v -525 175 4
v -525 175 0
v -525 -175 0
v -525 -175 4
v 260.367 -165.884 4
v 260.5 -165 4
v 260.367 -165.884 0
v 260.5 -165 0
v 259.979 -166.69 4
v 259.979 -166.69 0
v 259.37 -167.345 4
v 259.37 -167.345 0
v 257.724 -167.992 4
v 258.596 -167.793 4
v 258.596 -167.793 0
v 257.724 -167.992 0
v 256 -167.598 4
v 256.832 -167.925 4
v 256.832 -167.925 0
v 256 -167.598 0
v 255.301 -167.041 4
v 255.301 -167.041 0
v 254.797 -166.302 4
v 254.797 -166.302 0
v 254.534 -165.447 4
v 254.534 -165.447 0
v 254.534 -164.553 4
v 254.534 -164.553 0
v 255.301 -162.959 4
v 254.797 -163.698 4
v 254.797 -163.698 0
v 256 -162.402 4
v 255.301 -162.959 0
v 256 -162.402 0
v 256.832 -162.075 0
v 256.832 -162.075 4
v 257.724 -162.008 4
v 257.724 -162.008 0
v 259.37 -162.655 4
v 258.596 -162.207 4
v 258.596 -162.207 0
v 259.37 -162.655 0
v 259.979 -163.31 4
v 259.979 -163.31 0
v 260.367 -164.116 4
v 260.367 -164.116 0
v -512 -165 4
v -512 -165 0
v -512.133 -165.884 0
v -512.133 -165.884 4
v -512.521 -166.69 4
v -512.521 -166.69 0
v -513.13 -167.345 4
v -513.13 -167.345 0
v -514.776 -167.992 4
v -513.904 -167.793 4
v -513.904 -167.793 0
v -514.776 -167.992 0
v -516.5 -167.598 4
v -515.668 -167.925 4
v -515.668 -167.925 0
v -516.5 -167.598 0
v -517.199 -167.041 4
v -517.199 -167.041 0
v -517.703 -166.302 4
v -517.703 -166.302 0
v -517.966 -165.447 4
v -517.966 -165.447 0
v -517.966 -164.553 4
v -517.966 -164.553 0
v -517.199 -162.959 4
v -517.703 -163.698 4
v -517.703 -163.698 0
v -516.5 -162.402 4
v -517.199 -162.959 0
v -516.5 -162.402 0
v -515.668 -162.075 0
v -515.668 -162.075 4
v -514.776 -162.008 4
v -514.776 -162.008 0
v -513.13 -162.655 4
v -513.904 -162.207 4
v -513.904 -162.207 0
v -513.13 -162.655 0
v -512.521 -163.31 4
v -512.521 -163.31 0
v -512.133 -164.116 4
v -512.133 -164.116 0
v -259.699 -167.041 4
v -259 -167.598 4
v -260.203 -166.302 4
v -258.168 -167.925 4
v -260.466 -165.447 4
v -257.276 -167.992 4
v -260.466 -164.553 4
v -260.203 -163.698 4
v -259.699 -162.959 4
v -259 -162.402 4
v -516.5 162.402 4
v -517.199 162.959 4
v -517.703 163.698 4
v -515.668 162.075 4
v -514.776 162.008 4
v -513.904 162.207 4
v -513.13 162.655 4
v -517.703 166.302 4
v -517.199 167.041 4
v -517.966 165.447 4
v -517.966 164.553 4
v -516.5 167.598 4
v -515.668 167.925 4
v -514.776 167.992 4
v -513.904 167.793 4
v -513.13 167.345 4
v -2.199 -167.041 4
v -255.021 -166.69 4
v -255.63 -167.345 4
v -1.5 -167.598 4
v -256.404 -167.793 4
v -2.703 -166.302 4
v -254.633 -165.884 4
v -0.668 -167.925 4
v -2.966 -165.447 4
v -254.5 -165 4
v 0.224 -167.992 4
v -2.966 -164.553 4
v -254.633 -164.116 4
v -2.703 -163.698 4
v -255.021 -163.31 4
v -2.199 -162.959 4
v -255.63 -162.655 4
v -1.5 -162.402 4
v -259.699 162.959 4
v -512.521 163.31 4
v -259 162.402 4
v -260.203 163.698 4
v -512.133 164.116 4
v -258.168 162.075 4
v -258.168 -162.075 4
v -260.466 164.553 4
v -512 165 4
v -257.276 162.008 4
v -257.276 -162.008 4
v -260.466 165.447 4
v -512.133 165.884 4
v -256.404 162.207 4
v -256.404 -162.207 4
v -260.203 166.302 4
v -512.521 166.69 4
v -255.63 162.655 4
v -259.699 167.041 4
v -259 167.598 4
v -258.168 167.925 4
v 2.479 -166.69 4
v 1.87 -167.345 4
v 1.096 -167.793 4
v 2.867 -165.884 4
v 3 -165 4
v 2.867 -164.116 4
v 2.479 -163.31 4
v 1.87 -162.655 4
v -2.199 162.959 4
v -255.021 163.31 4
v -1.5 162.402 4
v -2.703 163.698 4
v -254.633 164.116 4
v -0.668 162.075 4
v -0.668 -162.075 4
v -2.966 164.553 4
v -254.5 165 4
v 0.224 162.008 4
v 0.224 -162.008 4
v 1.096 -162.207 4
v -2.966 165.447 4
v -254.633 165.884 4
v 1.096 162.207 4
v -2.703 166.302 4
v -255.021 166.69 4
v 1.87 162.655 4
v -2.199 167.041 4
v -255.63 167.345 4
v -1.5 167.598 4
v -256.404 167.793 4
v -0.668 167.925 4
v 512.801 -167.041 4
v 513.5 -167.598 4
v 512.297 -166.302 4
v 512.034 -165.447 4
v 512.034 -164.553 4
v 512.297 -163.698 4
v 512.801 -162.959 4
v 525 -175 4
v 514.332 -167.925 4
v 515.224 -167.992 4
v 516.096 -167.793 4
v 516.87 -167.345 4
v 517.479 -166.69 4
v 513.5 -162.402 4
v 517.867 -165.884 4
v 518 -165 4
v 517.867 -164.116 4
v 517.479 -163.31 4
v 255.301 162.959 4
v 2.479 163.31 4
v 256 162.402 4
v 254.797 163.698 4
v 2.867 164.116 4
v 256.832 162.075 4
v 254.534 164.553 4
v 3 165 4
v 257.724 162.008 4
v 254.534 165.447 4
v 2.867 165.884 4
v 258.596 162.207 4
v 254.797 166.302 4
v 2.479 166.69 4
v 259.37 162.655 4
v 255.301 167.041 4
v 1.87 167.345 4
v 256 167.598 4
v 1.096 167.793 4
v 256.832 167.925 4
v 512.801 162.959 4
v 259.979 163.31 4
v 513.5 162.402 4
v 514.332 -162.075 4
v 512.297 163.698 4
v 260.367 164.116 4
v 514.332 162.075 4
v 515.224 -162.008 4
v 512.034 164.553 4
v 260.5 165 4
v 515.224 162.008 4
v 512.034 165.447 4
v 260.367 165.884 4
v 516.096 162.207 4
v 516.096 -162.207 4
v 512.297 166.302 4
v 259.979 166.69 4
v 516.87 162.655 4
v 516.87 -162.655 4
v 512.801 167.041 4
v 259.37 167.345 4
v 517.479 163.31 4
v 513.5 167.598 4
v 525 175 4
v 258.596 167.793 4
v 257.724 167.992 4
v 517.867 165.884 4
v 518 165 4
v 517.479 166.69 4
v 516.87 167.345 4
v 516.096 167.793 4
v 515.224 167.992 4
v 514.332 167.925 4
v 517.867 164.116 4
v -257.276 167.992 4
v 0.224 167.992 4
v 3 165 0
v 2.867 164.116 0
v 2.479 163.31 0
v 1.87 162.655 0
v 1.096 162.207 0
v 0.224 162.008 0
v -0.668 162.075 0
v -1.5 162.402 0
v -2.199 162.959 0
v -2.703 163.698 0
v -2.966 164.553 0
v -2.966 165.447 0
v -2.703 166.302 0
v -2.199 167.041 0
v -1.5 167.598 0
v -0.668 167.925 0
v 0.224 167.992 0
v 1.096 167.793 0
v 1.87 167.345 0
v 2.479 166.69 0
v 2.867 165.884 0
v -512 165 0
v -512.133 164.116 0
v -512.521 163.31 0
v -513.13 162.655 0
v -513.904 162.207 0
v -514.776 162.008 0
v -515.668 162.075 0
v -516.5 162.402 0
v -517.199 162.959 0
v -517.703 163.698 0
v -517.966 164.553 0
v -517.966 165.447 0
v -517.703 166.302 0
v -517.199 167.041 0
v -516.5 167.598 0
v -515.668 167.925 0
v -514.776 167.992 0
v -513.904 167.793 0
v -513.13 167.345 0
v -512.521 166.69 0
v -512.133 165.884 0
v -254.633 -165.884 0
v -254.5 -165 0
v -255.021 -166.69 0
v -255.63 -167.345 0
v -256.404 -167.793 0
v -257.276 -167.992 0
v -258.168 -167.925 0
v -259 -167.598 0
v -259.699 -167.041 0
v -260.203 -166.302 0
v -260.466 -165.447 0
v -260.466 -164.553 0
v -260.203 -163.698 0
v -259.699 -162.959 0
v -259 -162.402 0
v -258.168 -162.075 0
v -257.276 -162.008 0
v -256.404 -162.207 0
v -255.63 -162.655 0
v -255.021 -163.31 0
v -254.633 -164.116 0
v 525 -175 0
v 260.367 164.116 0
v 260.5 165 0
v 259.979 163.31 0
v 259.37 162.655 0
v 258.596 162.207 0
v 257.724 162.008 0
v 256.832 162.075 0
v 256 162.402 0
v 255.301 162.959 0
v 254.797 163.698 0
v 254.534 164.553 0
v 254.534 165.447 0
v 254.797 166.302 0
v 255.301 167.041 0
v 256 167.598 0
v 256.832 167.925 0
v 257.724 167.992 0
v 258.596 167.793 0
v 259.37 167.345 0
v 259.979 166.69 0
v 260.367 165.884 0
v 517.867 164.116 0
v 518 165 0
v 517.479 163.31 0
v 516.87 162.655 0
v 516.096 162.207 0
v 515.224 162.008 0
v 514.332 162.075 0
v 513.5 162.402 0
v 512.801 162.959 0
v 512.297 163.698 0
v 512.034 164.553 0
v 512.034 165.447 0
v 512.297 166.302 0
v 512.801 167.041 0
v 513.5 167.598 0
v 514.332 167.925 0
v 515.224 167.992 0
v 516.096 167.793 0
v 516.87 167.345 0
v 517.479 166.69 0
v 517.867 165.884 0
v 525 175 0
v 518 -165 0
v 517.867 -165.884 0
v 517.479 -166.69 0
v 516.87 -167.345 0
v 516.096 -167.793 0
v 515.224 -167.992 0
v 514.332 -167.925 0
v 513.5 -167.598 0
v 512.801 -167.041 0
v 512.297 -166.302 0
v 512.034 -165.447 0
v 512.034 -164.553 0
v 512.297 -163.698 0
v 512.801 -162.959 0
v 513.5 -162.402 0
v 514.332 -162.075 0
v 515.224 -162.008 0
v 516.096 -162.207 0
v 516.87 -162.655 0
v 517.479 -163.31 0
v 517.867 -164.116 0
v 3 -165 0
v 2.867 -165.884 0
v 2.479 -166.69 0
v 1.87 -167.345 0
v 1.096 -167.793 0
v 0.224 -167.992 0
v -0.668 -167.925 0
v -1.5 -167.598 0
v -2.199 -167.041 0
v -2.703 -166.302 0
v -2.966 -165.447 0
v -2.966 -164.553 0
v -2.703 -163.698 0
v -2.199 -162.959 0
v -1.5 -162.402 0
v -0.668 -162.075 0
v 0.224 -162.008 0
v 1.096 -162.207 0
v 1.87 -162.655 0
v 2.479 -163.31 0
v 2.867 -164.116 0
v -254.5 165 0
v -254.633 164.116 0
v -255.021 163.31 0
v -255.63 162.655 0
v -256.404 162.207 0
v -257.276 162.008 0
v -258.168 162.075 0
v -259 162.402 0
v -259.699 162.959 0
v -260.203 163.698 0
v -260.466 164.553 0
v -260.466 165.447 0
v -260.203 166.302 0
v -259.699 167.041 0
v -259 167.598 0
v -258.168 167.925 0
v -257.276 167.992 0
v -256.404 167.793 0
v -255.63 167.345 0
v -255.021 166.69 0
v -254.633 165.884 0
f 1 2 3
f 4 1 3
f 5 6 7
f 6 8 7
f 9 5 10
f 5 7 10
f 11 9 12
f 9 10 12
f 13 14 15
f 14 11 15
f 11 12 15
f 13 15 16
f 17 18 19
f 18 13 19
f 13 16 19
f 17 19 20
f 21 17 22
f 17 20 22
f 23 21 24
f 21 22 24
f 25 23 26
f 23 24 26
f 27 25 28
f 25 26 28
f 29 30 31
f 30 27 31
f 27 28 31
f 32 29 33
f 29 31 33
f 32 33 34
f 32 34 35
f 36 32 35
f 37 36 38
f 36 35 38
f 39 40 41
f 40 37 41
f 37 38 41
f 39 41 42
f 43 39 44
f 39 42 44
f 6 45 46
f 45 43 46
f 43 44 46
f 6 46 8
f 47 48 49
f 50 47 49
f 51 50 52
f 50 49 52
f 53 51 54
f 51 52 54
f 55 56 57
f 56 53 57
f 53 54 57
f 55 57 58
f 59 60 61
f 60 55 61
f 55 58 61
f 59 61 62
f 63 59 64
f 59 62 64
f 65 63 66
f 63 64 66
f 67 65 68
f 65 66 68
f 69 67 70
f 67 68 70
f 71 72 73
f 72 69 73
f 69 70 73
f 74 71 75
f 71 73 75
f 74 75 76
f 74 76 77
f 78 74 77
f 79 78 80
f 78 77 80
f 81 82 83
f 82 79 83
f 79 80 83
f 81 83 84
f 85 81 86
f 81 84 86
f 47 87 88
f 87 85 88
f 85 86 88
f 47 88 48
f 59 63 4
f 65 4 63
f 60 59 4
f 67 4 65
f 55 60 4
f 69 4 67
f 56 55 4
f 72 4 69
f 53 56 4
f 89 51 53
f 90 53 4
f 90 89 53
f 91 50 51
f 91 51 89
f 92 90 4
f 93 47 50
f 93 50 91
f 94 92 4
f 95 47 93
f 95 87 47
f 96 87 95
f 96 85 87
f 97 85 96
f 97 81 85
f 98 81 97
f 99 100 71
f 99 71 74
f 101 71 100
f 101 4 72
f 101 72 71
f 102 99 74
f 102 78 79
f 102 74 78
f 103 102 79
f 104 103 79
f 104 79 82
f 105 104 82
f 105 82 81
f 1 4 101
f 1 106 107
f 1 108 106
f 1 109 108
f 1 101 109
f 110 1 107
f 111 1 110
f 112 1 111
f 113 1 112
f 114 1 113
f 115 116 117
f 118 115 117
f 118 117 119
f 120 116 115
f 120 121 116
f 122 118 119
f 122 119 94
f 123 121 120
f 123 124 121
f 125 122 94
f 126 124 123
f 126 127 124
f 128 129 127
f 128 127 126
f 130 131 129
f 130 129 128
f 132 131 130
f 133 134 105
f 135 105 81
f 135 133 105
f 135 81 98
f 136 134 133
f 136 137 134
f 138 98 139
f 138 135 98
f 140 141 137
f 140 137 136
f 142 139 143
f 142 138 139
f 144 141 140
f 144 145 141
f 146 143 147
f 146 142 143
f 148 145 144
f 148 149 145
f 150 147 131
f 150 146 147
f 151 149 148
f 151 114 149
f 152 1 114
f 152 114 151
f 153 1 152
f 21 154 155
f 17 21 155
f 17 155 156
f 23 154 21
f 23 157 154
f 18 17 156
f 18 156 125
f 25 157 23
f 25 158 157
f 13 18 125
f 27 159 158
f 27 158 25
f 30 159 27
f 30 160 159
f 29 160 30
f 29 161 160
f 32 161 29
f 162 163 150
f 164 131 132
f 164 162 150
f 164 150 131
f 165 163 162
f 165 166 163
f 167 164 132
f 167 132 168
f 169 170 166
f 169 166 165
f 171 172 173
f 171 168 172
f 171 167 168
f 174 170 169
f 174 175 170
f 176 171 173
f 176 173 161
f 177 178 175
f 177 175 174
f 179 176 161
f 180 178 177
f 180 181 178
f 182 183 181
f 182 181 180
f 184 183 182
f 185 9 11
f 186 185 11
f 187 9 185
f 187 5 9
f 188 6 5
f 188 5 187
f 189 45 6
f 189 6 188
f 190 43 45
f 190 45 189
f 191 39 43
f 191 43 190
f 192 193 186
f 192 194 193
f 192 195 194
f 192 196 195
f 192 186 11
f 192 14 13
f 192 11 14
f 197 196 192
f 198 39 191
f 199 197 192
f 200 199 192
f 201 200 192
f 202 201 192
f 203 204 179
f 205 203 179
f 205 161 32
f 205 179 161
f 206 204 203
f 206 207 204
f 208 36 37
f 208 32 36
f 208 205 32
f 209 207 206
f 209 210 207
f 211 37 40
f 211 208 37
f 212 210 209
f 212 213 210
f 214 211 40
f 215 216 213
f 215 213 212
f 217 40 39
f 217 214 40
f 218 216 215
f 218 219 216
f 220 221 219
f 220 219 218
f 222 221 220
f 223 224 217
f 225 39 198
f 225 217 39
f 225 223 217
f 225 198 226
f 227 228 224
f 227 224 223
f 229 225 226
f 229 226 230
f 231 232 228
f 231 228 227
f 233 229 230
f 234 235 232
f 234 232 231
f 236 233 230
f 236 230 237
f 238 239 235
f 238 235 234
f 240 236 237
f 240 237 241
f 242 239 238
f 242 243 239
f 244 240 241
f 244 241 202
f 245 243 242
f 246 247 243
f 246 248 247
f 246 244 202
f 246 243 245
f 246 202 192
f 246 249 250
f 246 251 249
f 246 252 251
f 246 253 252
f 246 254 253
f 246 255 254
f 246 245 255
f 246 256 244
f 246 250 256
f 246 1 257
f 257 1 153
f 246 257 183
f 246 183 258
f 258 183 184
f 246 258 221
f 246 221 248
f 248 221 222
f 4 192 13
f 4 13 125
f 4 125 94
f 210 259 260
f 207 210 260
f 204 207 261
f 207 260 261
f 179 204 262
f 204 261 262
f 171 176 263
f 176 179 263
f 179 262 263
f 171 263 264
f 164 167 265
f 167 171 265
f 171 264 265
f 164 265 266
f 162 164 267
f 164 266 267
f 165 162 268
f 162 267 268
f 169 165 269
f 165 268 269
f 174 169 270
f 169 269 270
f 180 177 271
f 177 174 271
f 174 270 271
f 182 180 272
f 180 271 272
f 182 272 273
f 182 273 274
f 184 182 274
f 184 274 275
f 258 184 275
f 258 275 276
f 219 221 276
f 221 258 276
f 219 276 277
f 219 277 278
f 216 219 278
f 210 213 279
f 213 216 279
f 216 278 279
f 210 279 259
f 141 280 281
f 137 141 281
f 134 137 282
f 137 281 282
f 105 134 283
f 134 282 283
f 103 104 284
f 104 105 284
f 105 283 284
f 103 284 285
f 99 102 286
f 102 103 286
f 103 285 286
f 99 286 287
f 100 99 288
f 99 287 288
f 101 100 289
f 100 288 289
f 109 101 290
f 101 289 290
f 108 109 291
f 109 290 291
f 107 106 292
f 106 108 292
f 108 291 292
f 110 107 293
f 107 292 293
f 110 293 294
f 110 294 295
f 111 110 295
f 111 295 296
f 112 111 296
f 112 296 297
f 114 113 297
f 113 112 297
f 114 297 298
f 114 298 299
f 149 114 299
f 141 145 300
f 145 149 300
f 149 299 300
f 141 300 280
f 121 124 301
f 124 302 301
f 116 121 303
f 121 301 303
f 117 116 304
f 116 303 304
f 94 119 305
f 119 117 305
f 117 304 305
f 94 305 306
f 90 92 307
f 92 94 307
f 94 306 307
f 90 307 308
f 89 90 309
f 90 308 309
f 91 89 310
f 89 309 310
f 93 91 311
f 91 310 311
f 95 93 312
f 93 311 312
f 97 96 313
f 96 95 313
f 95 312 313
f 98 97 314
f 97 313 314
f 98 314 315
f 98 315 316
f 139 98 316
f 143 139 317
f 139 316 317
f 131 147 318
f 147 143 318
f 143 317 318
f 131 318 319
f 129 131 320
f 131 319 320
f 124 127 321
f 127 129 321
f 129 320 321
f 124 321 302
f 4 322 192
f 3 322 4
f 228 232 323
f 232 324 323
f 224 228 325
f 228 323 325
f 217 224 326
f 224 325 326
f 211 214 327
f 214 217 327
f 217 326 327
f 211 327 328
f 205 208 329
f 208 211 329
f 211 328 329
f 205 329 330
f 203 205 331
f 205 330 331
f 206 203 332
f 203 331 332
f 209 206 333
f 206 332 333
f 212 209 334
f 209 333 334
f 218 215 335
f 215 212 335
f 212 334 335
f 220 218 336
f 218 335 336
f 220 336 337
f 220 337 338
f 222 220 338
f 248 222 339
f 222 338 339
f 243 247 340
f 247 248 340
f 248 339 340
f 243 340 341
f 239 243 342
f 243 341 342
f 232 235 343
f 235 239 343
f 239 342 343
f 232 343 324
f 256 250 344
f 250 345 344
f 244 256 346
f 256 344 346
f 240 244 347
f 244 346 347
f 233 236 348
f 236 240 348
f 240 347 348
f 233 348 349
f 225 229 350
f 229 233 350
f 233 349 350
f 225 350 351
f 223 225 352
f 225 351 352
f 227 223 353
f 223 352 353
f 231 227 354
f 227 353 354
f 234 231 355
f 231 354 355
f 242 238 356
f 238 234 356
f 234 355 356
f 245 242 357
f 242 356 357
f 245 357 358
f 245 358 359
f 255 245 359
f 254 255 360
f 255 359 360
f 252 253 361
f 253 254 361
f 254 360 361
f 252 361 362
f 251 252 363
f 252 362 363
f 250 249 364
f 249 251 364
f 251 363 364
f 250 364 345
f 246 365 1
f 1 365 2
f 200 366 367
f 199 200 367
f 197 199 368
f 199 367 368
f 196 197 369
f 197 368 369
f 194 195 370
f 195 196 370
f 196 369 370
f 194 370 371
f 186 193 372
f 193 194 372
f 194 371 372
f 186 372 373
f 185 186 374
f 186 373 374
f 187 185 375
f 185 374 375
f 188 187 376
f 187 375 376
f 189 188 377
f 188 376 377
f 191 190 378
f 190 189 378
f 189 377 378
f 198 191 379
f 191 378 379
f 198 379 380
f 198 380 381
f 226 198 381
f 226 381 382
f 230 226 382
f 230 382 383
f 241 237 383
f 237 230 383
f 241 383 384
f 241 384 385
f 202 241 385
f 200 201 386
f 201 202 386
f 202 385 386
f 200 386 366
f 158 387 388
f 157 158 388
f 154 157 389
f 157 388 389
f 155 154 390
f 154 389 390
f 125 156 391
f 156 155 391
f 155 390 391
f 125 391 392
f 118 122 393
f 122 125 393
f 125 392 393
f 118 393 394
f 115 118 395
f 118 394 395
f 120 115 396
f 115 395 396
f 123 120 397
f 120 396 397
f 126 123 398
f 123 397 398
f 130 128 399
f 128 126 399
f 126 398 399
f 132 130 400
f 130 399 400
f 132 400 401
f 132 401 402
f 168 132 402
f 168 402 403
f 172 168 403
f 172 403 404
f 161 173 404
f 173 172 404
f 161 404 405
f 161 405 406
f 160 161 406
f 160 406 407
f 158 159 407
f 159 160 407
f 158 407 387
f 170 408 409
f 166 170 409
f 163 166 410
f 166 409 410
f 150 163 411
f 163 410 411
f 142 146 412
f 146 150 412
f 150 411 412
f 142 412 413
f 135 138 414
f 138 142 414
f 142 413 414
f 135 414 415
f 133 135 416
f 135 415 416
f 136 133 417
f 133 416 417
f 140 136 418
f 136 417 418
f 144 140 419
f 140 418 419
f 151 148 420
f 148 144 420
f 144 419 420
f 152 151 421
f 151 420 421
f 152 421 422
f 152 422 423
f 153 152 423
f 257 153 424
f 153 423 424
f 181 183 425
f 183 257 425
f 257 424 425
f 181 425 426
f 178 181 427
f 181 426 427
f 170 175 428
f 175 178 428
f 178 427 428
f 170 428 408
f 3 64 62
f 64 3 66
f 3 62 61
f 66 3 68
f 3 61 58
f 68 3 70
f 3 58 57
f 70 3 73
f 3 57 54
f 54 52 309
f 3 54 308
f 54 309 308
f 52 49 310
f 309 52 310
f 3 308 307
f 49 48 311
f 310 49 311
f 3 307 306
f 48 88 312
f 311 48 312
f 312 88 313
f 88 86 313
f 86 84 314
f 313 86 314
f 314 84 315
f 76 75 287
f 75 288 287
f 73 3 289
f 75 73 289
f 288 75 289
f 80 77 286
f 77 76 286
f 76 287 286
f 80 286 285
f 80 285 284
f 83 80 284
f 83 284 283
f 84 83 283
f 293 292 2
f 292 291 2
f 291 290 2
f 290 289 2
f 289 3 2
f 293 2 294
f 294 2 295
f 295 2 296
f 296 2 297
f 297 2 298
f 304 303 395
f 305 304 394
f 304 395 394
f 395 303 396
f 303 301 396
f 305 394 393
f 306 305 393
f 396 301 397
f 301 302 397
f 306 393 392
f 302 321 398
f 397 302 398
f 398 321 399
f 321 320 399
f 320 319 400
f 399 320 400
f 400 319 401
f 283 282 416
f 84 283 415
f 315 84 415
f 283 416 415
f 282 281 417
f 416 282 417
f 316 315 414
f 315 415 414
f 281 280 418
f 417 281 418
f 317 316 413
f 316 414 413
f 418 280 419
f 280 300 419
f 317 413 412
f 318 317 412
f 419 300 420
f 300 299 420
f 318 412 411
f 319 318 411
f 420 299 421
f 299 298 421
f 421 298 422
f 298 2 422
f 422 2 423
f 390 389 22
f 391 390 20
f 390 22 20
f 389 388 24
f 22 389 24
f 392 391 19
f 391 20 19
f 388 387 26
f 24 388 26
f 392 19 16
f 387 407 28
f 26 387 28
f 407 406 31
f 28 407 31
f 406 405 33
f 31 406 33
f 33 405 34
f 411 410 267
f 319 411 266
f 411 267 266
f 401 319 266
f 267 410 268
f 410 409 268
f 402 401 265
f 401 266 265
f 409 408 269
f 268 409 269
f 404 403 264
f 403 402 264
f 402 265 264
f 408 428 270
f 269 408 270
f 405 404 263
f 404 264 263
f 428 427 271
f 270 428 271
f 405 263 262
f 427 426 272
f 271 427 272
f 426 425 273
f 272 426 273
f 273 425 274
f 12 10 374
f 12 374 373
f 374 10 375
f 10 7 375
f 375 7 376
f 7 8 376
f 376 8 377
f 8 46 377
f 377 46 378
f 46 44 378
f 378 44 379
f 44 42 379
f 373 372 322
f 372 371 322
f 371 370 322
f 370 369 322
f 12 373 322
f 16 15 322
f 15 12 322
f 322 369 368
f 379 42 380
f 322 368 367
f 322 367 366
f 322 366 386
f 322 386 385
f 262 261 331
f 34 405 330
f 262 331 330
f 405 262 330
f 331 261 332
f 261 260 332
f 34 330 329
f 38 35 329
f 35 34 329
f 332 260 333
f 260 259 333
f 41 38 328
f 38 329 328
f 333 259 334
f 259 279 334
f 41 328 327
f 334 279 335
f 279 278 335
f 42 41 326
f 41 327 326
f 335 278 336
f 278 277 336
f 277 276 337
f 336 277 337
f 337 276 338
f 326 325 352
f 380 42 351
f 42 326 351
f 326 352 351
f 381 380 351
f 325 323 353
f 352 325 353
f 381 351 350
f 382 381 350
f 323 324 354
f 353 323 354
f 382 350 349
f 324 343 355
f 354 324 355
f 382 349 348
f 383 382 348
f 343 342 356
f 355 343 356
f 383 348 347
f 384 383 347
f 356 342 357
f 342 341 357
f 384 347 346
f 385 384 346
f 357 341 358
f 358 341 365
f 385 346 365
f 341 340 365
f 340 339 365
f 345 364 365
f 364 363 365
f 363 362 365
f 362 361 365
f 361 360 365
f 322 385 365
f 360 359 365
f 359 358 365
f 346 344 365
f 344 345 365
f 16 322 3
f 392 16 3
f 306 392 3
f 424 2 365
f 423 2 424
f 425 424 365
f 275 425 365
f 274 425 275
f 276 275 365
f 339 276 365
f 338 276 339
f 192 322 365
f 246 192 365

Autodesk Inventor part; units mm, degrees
ref_plane "YZ Plane" through (0, 0, 0) normal (1, 0, 0) x (0, 1, 0)
ref_plane "XZ Plane" through (0, 0, 0) normal (0, 1, 0) x (-1, 0, 0)
ref_plane "XY Plane" through (0, 0, 0) normal (0, 0, 1) x (1, 0, 0)
sketch "Sketch1" plane through (0, 0, 0) normal (0, 0, 1) x (1, 0, 0)
  line L0 (525, 175) -> (-525, 175)
  line L1 (525, -175) -> (-525, -175)
  line L2 (-525, 175) -> (-525, -175)
  line L3 (525, -175) -> (525, 175)
  circle A0 centre (515, 165) radius 3
  line L4 (525, -175) -> (-525, -175)
  line L5 (-525, -175) -> (-525, 175)
  line L6 (-525, 175) -> (525, 175)
  line L7 (525, 175) -> (525, -175)
  circle A1 centre (-515, 165) radius 3
  circle A2 centre (257.5, 165) radius 3
  circle A3 centre (-515, -165) radius 3
  circle A4 centre (-257.5, -165) radius 3
  circle A5 centre (0, -165) radius 3
  circle A6 centre (257.5, -165) radius 3
  circle A7 centre (515, -165) radius 3
  circle A8 centre (-257.5, 165) radius 3
  circle A9 centre (0, 165) radius 3
  circle A10 centre (515, 165) radius 3
  arc A11 (434.5, 36.45) -> (475.35, 77.3) centre (434.5, 77.3) ccw
  line L8 (434.5, 36.45) -> (0, 36.45)
  line L9 (0, 36.45) -> (0, 32.15)
  line L10 (0, 32.15) -> (434.5, 32.15)
  arc A12 (434.5, 32.15) -> (479.65, 77.3) centre (434.5, 77.3) ccw
  line L11 (479.65, 77.3) -> (479.65, 85.5)
  arc A13 (479.65, 85.5) -> (434.5, 130.65) centre (434.5, 85.5) ccw
  line L12 (434.5, 130.65) -> (-434.5, 130.65)
  arc A14 (-434.5, 130.65) -> (-479.65, 85.5) centre (-434.5, 85.5) ccw
  line L13 (-479.65, 85.5) -> (-479.65, 65.8667)
  arc A15 (-479.65, 65.8667) -> (-434.5, 20.7167) centre (-434.5, 65.8667) ccw
  line L14 (-434.5, 20.7167) -> (445.75, 20.7167)
  arc A16 (445.75, 20.7167) -> (490.9, 65.8667) centre (445.75, 65.8667) ccw
  line L15 (490.9, 65.8667) -> (490.9, 96.25)
  arc A17 (490.9, 96.25) -> (445.75, 141.4) centre (445.75, 96.25) ccw
  line L16 (445.75, 141.4) -> (-445.75, 141.4)
  arc A18 (-445.75, 141.4) -> (-490.9, 96.25) centre (-445.75, 96.25) ccw
  line L17 (-490.9, 96.25) -> (-490.9, 54.4333)
  arc A19 (-490.9, 54.4333) -> (-445.75, 9.2833) centre (-445.75, 54.4333) ccw
  line L18 (-445.75, 9.2833) -> (457, 9.2833)
  arc A20 (457, 9.2833) -> (502.15, 54.4333) centre (457, 54.4333) ccw
  line L19 (502.15, 54.4333) -> (502.15, 107)
  arc A21 (502.15, 107) -> (457, 152.15) centre (457, 107) ccw
  line L20 (457, 152.15) -> (-457, 152.15)
  arc A22 (-457, 152.15) -> (-502.15, 107) centre (-457, 107) ccw
  line L21 (-502.15, 107) -> (-502.15, 43)
  arc A23 (-502.15, 43) -> (-457, -2.15) centre (-457, 43) ccw
  line L22 (-457, -2.15) -> (457, -2.15)
  arc A24 (497.85, -43) -> (457, -2.15) centre (457, -43) ccw
  line L23 (497.85, -43) -> (497.85, -107)
  arc A25 (457, -147.85) -> (497.85, -107) centre (457, -107) ccw
  line L24 (457, -147.85) -> (-457, -147.85)
  arc A26 (-497.85, -107) -> (-457, -147.85) centre (-457, -107) ccw
  line L25 (-497.85, -107) -> (-497.85, -54.4333)
  arc A27 (-457, -13.5833) -> (-497.85, -54.4333) centre (-457, -54.4333) ccw
  line L26 (-457, -13.5833) -> (445.75, -13.5833)
  arc A28 (486.6, -54.4333) -> (445.75, -13.5833) centre (445.75, -54.4333) ccw
  line L27 (486.6, -54.4333) -> (486.6, -96.25)
  arc A29 (445.75, -137.1) -> (486.6, -96.25) centre (445.75, -96.25) ccw
  line L28 (445.75, -137.1) -> (-445.75, -137.1)
  arc A30 (-486.6, -96.25) -> (-445.75, -137.1) centre (-445.75, -96.25) ccw
  line L29 (-486.6, -96.25) -> (-486.6, -65.8667)
  arc A31 (-445.75, -25.0167) -> (-486.6, -65.8667) centre (-445.75, -65.8667) ccw
  line L30 (-445.75, -25.0167) -> (434.5, -25.0167)
  arc A32 (475.35, -65.8667) -> (434.5, -25.0167) centre (434.5, -65.8667) ccw
  line L31 (475.35, -65.8667) -> (475.35, -85.5)
  arc A33 (434.5, -126.35) -> (475.35, -85.5) centre (434.5, -85.5) ccw
  line L32 (434.5, -126.35) -> (-434.5, -126.35)
  arc A34 (-475.35, -85.5) -> (-434.5, -126.35) centre (-434.5, -85.5) ccw
  line L33 (-475.35, -85.5) -> (-475.35, -77.3)
  arc A35 (-434.5, -36.45) -> (-475.35, -77.3) centre (-434.5, -77.3) ccw
  line L34 (-434.5, -36.45) -> (0, -36.45)
  line L35 (0, -36.45) -> (0, -32.15)
  line L36 (0, -32.15) -> (-434.5, -32.15)
  arc A36 (-434.5, -32.15) -> (-479.65, -77.3) centre (-434.5, -77.3) ccw
  line L37 (-479.65, -77.3) -> (-479.65, -85.5)
  arc A37 (-479.65, -85.5) -> (-434.5, -130.65) centre (-434.5, -85.5) ccw
  line L38 (-434.5, -130.65) -> (434.5, -130.65)
  arc A38 (434.5, -130.65) -> (479.65, -85.5) centre (434.5, -85.5) ccw
  line L39 (479.65, -85.5) -> (479.65, -65.8667)
  arc A39 (479.65, -65.8667) -> (434.5, -20.7167) centre (434.5, -65.8667) ccw
  line L40 (434.5, -20.7167) -> (-445.75, -20.7167)
  arc A40 (-445.75, -20.7167) -> (-490.9, -65.8667) centre (-445.75, -65.8667) ccw
  line L41 (-490.9, -65.8667) -> (-490.9, -96.25)
  arc A41 (-490.9, -96.25) -> (-445.75, -141.4) centre (-445.75, -96.25) ccw
  line L42 (-445.75, -141.4) -> (445.75, -141.4)
  arc A42 (445.75, -141.4) -> (490.9, -96.25) centre (445.75, -96.25) ccw
  line L43 (490.9, -96.25) -> (490.9, -54.4333)
  arc A43 (490.9, -54.4333) -> (445.75, -9.2833) centre (445.75, -54.4333) ccw
  line L44 (445.75, -9.2833) -> (-457, -9.2833)
  arc A44 (-457, -9.2833) -> (-502.15, -54.4333) centre (-457, -54.4333) ccw
  line L45 (-502.15, -54.4333) -> (-502.15, -107)
  arc A45 (-502.15, -107) -> (-457, -152.15) centre (-457, -107) ccw
  line L46 (-457, -152.15) -> (457, -152.15)
  arc A46 (457, -152.15) -> (502.15, -107) centre (457, -107) ccw
  line L47 (502.15, -107) -> (502.15, -43)
  arc A47 (502.15, -43) -> (457, 2.15) centre (457, -43) ccw
  line L48 (457, 2.15) -> (-457, 2.15)
  arc A48 (-497.85, 43) -> (-457, 2.15) centre (-457, 43) ccw
  line L49 (-497.85, 43) -> (-497.85, 107)
  arc A49 (-457, 147.85) -> (-497.85, 107) centre (-457, 107) ccw
  line L50 (-457, 147.85) -> (457, 147.85)
  arc A50 (497.85, 107) -> (457, 147.85) centre (457, 107) ccw
  line L51 (497.85, 107) -> (497.85, 54.4333)
  arc A51 (457, 13.5833) -> (497.85, 54.4333) centre (457, 54.4333) ccw
  line L52 (457, 13.5833) -> (-445.75, 13.5833)
  arc A52 (-486.6, 54.4333) -> (-445.75, 13.5833) centre (-445.75, 54.4333) ccw
  line L53 (-486.6, 54.4333) -> (-486.6, 96.25)
  arc A53 (-445.75, 137.1) -> (-486.6, 96.25) centre (-445.75, 96.25) ccw
  line L54 (-445.75, 137.1) -> (445.75, 137.1)
  arc A54 (486.6, 96.25) -> (445.75, 137.1) centre (445.75, 96.25) ccw
  line L55 (486.6, 96.25) -> (486.6, 65.8667)
  arc A55 (445.75, 25.0167) -> (486.6, 65.8667) centre (445.75, 65.8667) ccw
  line L56 (445.75, 25.0167) -> (-434.5, 25.0167)
  arc A56 (-475.35, 65.8667) -> (-434.5, 25.0167) centre (-434.5, 65.8667) ccw
  line L57 (-475.35, 65.8667) -> (-475.35, 85.5)
  arc A57 (-434.5, 126.35) -> (-475.35, 85.5) centre (-434.5, 85.5) ccw
  line L58 (-434.5, 126.35) -> (434.5, 126.35)
  arc A58 (475.35, 85.5) -> (434.5, 126.35) centre (434.5, 85.5) ccw
  line L59 (475.35, 85.5) -> (475.35, 77.3)
  point P0 (0, 0)
extrude "Extrusion1" add sketch "Sketch1" along normal blind 4 contours L3 L1 L2 L0 | A11 L59 A58 L58 A57 L57 A56 L56 A55 L55 A54 L54 A53 L53 A52 L52 A51 L51 A50 L50 A49 L49 A48 L48 A47 L47 A46 L46 A45 L45 A44 L44 A43 L43 A42 L42 A41 L41 A40 L40 A39 L39 A38 L38 A37 L37 A36 L36 L35 L34 A35 L33 A34 L32 A33 L31 A32 L30 A31 L29 A30 L28 A29 L27 A28 L26 A27 L25 A26 L24 A25 L23 A24 L22 A23 L21 A22 L20 A21 L19 A20 L18 A19 L17 A18 L16 A17 L15 A16 L14 A15 L13 A14 L12 A13 L11 A12 L10 L9 L8
properties part number "between aluminium and ferrite"
